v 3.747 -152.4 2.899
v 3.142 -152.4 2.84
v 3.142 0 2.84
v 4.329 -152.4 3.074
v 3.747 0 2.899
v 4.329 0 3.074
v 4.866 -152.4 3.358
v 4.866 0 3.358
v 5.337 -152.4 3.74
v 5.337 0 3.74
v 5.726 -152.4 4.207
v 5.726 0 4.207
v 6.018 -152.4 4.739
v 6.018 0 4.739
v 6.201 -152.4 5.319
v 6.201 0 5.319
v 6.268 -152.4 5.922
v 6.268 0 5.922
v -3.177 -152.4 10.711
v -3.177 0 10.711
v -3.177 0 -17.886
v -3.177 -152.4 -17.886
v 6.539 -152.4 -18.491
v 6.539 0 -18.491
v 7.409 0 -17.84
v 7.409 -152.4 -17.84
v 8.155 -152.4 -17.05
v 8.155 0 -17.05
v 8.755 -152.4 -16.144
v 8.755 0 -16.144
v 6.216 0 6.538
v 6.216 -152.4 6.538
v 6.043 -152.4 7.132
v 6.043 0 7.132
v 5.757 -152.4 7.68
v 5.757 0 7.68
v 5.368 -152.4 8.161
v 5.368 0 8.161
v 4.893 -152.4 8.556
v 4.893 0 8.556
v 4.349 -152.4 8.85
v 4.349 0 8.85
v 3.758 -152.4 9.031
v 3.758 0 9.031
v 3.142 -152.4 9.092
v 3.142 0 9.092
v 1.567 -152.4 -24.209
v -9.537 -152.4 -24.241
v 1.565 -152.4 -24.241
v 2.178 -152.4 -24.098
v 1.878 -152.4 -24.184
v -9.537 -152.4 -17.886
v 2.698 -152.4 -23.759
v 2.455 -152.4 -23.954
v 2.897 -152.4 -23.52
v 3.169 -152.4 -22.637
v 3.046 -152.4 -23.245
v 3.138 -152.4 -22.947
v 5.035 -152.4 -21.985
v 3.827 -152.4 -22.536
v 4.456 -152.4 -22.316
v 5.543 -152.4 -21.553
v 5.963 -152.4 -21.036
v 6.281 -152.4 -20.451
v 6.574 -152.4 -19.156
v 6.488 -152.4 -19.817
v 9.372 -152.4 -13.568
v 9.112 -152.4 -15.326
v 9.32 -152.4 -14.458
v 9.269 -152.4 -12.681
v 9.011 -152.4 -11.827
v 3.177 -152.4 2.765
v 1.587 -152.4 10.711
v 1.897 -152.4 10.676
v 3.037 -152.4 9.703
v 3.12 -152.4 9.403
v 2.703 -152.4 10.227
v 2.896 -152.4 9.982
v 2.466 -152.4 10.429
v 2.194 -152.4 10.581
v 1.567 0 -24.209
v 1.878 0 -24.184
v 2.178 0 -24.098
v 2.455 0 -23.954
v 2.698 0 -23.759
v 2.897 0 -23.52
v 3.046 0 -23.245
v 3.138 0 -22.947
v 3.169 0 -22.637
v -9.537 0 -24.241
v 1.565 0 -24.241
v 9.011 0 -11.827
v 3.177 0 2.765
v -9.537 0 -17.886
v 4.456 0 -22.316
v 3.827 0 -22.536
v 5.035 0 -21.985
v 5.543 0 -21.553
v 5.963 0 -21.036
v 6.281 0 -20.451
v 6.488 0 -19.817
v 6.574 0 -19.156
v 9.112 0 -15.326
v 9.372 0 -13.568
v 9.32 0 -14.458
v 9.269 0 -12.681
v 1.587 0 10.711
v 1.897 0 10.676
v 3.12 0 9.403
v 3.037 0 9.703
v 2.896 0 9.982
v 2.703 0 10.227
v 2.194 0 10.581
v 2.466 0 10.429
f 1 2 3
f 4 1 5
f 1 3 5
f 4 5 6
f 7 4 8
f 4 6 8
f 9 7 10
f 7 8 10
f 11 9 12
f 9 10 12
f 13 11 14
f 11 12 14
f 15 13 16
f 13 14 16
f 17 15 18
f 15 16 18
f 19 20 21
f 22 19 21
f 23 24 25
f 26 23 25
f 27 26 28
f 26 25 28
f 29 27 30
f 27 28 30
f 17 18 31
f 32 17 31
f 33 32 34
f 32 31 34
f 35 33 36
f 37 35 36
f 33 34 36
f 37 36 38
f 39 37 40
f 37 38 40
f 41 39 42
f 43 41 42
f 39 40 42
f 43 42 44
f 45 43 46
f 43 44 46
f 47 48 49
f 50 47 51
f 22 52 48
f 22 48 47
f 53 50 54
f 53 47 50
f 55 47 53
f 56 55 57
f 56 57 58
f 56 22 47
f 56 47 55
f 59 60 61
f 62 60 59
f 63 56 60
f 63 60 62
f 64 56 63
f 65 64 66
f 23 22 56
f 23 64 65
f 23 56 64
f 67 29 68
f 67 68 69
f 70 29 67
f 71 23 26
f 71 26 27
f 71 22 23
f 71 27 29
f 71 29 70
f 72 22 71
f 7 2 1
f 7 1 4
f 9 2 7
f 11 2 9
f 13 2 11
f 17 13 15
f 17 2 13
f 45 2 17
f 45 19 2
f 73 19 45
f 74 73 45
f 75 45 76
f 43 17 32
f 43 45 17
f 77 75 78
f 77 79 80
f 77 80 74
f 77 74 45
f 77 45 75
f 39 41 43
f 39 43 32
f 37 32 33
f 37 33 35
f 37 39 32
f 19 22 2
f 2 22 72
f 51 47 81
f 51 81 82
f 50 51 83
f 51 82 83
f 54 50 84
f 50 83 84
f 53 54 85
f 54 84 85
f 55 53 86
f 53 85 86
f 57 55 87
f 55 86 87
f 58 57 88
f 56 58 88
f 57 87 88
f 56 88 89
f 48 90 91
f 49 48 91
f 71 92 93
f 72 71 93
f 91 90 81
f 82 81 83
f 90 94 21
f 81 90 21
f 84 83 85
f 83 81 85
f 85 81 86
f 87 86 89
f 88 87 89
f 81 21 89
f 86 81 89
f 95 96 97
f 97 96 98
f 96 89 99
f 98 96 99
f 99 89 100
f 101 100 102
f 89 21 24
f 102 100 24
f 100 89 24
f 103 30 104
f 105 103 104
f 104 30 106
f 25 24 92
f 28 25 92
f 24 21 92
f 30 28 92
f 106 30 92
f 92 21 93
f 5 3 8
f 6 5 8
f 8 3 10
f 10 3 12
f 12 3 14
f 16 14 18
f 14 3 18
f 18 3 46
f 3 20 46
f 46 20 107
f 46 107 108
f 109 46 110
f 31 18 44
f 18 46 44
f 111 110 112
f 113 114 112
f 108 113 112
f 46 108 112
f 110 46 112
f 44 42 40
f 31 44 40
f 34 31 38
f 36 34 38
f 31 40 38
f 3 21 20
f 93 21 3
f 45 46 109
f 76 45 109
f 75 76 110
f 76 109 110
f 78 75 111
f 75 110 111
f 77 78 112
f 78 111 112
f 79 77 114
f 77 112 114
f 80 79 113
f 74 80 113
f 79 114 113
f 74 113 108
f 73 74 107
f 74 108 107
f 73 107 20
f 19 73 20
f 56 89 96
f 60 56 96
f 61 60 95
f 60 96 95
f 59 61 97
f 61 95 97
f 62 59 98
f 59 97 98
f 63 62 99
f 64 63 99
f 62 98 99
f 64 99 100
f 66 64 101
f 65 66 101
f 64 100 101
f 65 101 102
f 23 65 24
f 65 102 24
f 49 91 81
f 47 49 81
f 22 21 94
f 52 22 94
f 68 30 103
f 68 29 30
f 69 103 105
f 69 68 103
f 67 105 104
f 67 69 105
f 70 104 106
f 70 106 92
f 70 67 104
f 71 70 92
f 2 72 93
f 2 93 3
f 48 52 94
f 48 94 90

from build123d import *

# Parameters (mm, degrees)
F1_DEPTH = 152.4
F2_R     = 5.08


with BuildPart() as f1:
    # F0 (on Front) → F1 (new body)
    with BuildSketch(Plane.XZ):
        with BuildLine():
            Line((-9.537221, -24.241146), (1.565489, -24.241146))
            Line((1.565489, -24.241146), (1.56726, -24.209019))
            ThreePointArc((1.56726, -24.209019), (2.697703, -23.759048), (3.168511, -22.637123))
            ThreePointArc((3.168511, -22.637123), (5.764587, -21.304554), (6.538678, -18.490993))
            ThreePointArc((6.538678, -18.490993), (8.729447, -16.190785), (9.526789, -13.11594))
            Line((9.526789, -13.11594), (3.176628, 2.764589))
            Line((3.176628, 2.764589), (3.142439, 2.839835))
            ThreePointArc((3.142439, 2.839835), (5.337396, 3.740061), (6.268152, 5.922246))
            ThreePointArc((6.268152, 5.922246), (5.368231, 8.160809), (3.142439, 9.09187))
            ThreePointArc((3.142439, 9.09187), (2.703335, 10.226903), (1.586881, 10.711301))
            Line((1.586881, 10.711301), (-3.176984, 10.711301))
            Line((-3.176984, 10.711301), (-3.176984, -17.886454))
            Line((-3.176984, -17.886454), (-9.537221, -17.886454))
            Line((-9.537221, -17.886454), (-9.537221, -24.241146))
        make_face()
    extrude(amount=F1_DEPTH)

    # F2
    f2_edges = [f1.edges().sort_by_distance(p)[0] for p in [
        (9.526789, -76.2, -13.11594),
    ]]
    fillet(f2_edges, radius=F2_R)


solid = f1.part
